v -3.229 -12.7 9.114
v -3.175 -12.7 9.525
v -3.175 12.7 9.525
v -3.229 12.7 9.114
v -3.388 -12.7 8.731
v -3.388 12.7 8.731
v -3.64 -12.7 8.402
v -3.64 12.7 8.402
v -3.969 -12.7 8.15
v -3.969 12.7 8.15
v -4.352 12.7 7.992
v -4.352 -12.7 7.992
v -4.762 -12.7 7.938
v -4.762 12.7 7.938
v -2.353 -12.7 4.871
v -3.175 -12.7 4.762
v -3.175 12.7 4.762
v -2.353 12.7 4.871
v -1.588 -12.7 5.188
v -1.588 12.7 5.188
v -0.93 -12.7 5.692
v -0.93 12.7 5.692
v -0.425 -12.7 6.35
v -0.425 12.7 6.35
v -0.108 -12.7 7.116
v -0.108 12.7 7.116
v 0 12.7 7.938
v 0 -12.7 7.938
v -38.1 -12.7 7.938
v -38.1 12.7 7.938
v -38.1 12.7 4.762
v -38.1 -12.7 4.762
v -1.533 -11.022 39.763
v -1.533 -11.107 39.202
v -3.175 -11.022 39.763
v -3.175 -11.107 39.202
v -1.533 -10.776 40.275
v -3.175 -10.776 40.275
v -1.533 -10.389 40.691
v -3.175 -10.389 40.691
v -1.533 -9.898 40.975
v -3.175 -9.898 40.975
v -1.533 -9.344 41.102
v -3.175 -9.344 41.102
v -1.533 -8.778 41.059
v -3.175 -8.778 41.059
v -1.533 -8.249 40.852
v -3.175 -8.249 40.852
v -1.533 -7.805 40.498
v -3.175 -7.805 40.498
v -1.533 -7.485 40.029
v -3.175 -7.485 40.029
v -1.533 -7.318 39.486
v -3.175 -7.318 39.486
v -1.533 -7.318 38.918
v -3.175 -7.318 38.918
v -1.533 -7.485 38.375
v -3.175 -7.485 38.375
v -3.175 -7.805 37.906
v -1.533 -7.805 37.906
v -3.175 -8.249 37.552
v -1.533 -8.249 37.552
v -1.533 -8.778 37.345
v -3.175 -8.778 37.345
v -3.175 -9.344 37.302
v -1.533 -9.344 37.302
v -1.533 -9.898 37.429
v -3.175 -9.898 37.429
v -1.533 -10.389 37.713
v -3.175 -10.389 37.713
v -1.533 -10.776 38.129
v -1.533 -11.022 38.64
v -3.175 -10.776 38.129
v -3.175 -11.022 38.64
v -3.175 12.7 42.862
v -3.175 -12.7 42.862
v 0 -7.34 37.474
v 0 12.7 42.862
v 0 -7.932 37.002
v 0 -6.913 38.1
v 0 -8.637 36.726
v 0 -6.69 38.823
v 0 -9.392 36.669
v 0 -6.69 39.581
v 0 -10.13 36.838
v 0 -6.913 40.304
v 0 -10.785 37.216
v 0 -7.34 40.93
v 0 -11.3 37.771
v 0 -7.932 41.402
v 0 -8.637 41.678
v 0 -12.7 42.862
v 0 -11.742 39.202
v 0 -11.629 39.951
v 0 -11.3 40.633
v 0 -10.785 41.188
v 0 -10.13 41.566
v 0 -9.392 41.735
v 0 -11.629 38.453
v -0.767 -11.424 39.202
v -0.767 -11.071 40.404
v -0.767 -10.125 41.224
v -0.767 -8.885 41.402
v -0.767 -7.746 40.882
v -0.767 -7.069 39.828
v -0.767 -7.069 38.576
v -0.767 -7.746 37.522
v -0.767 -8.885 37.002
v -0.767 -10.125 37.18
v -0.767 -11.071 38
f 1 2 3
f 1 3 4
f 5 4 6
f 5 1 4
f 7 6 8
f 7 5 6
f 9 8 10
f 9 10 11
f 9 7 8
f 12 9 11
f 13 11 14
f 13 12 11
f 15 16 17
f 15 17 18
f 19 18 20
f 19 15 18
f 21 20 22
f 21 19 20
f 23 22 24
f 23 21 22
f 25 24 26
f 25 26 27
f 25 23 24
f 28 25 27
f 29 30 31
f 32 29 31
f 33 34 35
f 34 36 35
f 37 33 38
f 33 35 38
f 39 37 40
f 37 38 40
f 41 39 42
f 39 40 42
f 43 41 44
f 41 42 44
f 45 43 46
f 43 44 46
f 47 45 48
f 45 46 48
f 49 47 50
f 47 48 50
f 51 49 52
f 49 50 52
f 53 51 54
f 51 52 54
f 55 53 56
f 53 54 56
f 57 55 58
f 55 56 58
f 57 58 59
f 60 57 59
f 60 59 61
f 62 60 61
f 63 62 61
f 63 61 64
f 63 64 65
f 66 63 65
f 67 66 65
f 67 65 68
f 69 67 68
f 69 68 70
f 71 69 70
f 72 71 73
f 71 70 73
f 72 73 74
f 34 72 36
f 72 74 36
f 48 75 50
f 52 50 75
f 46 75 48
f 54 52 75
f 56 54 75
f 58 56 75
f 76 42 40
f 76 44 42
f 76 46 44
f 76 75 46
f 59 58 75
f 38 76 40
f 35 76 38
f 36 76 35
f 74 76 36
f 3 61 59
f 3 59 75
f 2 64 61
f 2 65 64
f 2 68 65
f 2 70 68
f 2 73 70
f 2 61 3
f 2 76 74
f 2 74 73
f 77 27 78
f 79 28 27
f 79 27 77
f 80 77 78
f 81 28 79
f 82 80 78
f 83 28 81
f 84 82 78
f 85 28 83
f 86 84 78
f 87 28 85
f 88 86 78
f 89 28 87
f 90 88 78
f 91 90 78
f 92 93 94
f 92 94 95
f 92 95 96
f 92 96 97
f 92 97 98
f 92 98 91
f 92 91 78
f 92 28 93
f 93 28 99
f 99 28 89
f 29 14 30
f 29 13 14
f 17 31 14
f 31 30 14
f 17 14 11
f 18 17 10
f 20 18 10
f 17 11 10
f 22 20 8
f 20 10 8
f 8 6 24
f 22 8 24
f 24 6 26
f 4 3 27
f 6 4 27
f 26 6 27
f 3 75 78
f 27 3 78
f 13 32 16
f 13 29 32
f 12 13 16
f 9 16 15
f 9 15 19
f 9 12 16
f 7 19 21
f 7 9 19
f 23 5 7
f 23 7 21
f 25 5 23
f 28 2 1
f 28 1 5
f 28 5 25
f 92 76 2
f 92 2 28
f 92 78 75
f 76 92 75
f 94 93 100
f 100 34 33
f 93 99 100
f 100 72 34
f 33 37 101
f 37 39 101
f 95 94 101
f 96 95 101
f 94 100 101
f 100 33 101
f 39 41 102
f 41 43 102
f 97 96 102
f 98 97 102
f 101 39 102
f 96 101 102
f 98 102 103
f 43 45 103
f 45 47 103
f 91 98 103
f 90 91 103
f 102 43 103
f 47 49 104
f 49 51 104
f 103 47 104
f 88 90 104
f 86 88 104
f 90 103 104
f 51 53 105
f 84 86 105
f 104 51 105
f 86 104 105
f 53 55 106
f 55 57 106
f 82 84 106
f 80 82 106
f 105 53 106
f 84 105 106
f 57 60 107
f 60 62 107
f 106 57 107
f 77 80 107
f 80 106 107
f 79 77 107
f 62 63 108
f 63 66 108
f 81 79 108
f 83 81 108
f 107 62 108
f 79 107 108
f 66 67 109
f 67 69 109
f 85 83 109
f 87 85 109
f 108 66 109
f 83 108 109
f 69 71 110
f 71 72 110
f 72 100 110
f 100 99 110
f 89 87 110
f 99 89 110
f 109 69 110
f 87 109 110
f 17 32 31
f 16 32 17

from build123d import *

# Parameters (mm, degrees)
F1_DEPTH       = 12.7
F3_D           = 3.81
F3_CSINK_D     = 5.08
F3_CSINK_ANGLE = 45


with BuildPart() as f1:
    # F0 (on Front) → F1 (new body, symmetric)
    with BuildSketch(Plane.XZ):
        with BuildLine():
            Line((-38.1, 4.7625), (-3.175, 4.7625))
            ThreePointArc((-3.175, 4.7625), (-0.929936, 5.692436), (0, 7.9375))
            Line((0, 7.9375), (0, 42.8625))
            Line((0, 42.8625), (-3.175, 42.8625))
            Line((-3.175, 42.8625), (-3.175, 9.525))
            ThreePointArc((-3.175, 9.525), (-3.639968, 8.402468), (-4.7625, 7.9375))
            Line((-4.7625, 7.9375), (-38.1, 7.9375))
            Line((-38.1, 7.9375), (-38.1, 4.7625))
        make_face()
    extrude(amount=F1_DEPTH, both=True)

    # F3 (through all)
    with Locations(Plane.YZ):
        with Locations((-9.201728, 39.201986)):
            CounterSinkHole(F3_D / 2, F3_CSINK_D / 2, counter_sink_angle=F3_CSINK_ANGLE)


solid = f1.part
